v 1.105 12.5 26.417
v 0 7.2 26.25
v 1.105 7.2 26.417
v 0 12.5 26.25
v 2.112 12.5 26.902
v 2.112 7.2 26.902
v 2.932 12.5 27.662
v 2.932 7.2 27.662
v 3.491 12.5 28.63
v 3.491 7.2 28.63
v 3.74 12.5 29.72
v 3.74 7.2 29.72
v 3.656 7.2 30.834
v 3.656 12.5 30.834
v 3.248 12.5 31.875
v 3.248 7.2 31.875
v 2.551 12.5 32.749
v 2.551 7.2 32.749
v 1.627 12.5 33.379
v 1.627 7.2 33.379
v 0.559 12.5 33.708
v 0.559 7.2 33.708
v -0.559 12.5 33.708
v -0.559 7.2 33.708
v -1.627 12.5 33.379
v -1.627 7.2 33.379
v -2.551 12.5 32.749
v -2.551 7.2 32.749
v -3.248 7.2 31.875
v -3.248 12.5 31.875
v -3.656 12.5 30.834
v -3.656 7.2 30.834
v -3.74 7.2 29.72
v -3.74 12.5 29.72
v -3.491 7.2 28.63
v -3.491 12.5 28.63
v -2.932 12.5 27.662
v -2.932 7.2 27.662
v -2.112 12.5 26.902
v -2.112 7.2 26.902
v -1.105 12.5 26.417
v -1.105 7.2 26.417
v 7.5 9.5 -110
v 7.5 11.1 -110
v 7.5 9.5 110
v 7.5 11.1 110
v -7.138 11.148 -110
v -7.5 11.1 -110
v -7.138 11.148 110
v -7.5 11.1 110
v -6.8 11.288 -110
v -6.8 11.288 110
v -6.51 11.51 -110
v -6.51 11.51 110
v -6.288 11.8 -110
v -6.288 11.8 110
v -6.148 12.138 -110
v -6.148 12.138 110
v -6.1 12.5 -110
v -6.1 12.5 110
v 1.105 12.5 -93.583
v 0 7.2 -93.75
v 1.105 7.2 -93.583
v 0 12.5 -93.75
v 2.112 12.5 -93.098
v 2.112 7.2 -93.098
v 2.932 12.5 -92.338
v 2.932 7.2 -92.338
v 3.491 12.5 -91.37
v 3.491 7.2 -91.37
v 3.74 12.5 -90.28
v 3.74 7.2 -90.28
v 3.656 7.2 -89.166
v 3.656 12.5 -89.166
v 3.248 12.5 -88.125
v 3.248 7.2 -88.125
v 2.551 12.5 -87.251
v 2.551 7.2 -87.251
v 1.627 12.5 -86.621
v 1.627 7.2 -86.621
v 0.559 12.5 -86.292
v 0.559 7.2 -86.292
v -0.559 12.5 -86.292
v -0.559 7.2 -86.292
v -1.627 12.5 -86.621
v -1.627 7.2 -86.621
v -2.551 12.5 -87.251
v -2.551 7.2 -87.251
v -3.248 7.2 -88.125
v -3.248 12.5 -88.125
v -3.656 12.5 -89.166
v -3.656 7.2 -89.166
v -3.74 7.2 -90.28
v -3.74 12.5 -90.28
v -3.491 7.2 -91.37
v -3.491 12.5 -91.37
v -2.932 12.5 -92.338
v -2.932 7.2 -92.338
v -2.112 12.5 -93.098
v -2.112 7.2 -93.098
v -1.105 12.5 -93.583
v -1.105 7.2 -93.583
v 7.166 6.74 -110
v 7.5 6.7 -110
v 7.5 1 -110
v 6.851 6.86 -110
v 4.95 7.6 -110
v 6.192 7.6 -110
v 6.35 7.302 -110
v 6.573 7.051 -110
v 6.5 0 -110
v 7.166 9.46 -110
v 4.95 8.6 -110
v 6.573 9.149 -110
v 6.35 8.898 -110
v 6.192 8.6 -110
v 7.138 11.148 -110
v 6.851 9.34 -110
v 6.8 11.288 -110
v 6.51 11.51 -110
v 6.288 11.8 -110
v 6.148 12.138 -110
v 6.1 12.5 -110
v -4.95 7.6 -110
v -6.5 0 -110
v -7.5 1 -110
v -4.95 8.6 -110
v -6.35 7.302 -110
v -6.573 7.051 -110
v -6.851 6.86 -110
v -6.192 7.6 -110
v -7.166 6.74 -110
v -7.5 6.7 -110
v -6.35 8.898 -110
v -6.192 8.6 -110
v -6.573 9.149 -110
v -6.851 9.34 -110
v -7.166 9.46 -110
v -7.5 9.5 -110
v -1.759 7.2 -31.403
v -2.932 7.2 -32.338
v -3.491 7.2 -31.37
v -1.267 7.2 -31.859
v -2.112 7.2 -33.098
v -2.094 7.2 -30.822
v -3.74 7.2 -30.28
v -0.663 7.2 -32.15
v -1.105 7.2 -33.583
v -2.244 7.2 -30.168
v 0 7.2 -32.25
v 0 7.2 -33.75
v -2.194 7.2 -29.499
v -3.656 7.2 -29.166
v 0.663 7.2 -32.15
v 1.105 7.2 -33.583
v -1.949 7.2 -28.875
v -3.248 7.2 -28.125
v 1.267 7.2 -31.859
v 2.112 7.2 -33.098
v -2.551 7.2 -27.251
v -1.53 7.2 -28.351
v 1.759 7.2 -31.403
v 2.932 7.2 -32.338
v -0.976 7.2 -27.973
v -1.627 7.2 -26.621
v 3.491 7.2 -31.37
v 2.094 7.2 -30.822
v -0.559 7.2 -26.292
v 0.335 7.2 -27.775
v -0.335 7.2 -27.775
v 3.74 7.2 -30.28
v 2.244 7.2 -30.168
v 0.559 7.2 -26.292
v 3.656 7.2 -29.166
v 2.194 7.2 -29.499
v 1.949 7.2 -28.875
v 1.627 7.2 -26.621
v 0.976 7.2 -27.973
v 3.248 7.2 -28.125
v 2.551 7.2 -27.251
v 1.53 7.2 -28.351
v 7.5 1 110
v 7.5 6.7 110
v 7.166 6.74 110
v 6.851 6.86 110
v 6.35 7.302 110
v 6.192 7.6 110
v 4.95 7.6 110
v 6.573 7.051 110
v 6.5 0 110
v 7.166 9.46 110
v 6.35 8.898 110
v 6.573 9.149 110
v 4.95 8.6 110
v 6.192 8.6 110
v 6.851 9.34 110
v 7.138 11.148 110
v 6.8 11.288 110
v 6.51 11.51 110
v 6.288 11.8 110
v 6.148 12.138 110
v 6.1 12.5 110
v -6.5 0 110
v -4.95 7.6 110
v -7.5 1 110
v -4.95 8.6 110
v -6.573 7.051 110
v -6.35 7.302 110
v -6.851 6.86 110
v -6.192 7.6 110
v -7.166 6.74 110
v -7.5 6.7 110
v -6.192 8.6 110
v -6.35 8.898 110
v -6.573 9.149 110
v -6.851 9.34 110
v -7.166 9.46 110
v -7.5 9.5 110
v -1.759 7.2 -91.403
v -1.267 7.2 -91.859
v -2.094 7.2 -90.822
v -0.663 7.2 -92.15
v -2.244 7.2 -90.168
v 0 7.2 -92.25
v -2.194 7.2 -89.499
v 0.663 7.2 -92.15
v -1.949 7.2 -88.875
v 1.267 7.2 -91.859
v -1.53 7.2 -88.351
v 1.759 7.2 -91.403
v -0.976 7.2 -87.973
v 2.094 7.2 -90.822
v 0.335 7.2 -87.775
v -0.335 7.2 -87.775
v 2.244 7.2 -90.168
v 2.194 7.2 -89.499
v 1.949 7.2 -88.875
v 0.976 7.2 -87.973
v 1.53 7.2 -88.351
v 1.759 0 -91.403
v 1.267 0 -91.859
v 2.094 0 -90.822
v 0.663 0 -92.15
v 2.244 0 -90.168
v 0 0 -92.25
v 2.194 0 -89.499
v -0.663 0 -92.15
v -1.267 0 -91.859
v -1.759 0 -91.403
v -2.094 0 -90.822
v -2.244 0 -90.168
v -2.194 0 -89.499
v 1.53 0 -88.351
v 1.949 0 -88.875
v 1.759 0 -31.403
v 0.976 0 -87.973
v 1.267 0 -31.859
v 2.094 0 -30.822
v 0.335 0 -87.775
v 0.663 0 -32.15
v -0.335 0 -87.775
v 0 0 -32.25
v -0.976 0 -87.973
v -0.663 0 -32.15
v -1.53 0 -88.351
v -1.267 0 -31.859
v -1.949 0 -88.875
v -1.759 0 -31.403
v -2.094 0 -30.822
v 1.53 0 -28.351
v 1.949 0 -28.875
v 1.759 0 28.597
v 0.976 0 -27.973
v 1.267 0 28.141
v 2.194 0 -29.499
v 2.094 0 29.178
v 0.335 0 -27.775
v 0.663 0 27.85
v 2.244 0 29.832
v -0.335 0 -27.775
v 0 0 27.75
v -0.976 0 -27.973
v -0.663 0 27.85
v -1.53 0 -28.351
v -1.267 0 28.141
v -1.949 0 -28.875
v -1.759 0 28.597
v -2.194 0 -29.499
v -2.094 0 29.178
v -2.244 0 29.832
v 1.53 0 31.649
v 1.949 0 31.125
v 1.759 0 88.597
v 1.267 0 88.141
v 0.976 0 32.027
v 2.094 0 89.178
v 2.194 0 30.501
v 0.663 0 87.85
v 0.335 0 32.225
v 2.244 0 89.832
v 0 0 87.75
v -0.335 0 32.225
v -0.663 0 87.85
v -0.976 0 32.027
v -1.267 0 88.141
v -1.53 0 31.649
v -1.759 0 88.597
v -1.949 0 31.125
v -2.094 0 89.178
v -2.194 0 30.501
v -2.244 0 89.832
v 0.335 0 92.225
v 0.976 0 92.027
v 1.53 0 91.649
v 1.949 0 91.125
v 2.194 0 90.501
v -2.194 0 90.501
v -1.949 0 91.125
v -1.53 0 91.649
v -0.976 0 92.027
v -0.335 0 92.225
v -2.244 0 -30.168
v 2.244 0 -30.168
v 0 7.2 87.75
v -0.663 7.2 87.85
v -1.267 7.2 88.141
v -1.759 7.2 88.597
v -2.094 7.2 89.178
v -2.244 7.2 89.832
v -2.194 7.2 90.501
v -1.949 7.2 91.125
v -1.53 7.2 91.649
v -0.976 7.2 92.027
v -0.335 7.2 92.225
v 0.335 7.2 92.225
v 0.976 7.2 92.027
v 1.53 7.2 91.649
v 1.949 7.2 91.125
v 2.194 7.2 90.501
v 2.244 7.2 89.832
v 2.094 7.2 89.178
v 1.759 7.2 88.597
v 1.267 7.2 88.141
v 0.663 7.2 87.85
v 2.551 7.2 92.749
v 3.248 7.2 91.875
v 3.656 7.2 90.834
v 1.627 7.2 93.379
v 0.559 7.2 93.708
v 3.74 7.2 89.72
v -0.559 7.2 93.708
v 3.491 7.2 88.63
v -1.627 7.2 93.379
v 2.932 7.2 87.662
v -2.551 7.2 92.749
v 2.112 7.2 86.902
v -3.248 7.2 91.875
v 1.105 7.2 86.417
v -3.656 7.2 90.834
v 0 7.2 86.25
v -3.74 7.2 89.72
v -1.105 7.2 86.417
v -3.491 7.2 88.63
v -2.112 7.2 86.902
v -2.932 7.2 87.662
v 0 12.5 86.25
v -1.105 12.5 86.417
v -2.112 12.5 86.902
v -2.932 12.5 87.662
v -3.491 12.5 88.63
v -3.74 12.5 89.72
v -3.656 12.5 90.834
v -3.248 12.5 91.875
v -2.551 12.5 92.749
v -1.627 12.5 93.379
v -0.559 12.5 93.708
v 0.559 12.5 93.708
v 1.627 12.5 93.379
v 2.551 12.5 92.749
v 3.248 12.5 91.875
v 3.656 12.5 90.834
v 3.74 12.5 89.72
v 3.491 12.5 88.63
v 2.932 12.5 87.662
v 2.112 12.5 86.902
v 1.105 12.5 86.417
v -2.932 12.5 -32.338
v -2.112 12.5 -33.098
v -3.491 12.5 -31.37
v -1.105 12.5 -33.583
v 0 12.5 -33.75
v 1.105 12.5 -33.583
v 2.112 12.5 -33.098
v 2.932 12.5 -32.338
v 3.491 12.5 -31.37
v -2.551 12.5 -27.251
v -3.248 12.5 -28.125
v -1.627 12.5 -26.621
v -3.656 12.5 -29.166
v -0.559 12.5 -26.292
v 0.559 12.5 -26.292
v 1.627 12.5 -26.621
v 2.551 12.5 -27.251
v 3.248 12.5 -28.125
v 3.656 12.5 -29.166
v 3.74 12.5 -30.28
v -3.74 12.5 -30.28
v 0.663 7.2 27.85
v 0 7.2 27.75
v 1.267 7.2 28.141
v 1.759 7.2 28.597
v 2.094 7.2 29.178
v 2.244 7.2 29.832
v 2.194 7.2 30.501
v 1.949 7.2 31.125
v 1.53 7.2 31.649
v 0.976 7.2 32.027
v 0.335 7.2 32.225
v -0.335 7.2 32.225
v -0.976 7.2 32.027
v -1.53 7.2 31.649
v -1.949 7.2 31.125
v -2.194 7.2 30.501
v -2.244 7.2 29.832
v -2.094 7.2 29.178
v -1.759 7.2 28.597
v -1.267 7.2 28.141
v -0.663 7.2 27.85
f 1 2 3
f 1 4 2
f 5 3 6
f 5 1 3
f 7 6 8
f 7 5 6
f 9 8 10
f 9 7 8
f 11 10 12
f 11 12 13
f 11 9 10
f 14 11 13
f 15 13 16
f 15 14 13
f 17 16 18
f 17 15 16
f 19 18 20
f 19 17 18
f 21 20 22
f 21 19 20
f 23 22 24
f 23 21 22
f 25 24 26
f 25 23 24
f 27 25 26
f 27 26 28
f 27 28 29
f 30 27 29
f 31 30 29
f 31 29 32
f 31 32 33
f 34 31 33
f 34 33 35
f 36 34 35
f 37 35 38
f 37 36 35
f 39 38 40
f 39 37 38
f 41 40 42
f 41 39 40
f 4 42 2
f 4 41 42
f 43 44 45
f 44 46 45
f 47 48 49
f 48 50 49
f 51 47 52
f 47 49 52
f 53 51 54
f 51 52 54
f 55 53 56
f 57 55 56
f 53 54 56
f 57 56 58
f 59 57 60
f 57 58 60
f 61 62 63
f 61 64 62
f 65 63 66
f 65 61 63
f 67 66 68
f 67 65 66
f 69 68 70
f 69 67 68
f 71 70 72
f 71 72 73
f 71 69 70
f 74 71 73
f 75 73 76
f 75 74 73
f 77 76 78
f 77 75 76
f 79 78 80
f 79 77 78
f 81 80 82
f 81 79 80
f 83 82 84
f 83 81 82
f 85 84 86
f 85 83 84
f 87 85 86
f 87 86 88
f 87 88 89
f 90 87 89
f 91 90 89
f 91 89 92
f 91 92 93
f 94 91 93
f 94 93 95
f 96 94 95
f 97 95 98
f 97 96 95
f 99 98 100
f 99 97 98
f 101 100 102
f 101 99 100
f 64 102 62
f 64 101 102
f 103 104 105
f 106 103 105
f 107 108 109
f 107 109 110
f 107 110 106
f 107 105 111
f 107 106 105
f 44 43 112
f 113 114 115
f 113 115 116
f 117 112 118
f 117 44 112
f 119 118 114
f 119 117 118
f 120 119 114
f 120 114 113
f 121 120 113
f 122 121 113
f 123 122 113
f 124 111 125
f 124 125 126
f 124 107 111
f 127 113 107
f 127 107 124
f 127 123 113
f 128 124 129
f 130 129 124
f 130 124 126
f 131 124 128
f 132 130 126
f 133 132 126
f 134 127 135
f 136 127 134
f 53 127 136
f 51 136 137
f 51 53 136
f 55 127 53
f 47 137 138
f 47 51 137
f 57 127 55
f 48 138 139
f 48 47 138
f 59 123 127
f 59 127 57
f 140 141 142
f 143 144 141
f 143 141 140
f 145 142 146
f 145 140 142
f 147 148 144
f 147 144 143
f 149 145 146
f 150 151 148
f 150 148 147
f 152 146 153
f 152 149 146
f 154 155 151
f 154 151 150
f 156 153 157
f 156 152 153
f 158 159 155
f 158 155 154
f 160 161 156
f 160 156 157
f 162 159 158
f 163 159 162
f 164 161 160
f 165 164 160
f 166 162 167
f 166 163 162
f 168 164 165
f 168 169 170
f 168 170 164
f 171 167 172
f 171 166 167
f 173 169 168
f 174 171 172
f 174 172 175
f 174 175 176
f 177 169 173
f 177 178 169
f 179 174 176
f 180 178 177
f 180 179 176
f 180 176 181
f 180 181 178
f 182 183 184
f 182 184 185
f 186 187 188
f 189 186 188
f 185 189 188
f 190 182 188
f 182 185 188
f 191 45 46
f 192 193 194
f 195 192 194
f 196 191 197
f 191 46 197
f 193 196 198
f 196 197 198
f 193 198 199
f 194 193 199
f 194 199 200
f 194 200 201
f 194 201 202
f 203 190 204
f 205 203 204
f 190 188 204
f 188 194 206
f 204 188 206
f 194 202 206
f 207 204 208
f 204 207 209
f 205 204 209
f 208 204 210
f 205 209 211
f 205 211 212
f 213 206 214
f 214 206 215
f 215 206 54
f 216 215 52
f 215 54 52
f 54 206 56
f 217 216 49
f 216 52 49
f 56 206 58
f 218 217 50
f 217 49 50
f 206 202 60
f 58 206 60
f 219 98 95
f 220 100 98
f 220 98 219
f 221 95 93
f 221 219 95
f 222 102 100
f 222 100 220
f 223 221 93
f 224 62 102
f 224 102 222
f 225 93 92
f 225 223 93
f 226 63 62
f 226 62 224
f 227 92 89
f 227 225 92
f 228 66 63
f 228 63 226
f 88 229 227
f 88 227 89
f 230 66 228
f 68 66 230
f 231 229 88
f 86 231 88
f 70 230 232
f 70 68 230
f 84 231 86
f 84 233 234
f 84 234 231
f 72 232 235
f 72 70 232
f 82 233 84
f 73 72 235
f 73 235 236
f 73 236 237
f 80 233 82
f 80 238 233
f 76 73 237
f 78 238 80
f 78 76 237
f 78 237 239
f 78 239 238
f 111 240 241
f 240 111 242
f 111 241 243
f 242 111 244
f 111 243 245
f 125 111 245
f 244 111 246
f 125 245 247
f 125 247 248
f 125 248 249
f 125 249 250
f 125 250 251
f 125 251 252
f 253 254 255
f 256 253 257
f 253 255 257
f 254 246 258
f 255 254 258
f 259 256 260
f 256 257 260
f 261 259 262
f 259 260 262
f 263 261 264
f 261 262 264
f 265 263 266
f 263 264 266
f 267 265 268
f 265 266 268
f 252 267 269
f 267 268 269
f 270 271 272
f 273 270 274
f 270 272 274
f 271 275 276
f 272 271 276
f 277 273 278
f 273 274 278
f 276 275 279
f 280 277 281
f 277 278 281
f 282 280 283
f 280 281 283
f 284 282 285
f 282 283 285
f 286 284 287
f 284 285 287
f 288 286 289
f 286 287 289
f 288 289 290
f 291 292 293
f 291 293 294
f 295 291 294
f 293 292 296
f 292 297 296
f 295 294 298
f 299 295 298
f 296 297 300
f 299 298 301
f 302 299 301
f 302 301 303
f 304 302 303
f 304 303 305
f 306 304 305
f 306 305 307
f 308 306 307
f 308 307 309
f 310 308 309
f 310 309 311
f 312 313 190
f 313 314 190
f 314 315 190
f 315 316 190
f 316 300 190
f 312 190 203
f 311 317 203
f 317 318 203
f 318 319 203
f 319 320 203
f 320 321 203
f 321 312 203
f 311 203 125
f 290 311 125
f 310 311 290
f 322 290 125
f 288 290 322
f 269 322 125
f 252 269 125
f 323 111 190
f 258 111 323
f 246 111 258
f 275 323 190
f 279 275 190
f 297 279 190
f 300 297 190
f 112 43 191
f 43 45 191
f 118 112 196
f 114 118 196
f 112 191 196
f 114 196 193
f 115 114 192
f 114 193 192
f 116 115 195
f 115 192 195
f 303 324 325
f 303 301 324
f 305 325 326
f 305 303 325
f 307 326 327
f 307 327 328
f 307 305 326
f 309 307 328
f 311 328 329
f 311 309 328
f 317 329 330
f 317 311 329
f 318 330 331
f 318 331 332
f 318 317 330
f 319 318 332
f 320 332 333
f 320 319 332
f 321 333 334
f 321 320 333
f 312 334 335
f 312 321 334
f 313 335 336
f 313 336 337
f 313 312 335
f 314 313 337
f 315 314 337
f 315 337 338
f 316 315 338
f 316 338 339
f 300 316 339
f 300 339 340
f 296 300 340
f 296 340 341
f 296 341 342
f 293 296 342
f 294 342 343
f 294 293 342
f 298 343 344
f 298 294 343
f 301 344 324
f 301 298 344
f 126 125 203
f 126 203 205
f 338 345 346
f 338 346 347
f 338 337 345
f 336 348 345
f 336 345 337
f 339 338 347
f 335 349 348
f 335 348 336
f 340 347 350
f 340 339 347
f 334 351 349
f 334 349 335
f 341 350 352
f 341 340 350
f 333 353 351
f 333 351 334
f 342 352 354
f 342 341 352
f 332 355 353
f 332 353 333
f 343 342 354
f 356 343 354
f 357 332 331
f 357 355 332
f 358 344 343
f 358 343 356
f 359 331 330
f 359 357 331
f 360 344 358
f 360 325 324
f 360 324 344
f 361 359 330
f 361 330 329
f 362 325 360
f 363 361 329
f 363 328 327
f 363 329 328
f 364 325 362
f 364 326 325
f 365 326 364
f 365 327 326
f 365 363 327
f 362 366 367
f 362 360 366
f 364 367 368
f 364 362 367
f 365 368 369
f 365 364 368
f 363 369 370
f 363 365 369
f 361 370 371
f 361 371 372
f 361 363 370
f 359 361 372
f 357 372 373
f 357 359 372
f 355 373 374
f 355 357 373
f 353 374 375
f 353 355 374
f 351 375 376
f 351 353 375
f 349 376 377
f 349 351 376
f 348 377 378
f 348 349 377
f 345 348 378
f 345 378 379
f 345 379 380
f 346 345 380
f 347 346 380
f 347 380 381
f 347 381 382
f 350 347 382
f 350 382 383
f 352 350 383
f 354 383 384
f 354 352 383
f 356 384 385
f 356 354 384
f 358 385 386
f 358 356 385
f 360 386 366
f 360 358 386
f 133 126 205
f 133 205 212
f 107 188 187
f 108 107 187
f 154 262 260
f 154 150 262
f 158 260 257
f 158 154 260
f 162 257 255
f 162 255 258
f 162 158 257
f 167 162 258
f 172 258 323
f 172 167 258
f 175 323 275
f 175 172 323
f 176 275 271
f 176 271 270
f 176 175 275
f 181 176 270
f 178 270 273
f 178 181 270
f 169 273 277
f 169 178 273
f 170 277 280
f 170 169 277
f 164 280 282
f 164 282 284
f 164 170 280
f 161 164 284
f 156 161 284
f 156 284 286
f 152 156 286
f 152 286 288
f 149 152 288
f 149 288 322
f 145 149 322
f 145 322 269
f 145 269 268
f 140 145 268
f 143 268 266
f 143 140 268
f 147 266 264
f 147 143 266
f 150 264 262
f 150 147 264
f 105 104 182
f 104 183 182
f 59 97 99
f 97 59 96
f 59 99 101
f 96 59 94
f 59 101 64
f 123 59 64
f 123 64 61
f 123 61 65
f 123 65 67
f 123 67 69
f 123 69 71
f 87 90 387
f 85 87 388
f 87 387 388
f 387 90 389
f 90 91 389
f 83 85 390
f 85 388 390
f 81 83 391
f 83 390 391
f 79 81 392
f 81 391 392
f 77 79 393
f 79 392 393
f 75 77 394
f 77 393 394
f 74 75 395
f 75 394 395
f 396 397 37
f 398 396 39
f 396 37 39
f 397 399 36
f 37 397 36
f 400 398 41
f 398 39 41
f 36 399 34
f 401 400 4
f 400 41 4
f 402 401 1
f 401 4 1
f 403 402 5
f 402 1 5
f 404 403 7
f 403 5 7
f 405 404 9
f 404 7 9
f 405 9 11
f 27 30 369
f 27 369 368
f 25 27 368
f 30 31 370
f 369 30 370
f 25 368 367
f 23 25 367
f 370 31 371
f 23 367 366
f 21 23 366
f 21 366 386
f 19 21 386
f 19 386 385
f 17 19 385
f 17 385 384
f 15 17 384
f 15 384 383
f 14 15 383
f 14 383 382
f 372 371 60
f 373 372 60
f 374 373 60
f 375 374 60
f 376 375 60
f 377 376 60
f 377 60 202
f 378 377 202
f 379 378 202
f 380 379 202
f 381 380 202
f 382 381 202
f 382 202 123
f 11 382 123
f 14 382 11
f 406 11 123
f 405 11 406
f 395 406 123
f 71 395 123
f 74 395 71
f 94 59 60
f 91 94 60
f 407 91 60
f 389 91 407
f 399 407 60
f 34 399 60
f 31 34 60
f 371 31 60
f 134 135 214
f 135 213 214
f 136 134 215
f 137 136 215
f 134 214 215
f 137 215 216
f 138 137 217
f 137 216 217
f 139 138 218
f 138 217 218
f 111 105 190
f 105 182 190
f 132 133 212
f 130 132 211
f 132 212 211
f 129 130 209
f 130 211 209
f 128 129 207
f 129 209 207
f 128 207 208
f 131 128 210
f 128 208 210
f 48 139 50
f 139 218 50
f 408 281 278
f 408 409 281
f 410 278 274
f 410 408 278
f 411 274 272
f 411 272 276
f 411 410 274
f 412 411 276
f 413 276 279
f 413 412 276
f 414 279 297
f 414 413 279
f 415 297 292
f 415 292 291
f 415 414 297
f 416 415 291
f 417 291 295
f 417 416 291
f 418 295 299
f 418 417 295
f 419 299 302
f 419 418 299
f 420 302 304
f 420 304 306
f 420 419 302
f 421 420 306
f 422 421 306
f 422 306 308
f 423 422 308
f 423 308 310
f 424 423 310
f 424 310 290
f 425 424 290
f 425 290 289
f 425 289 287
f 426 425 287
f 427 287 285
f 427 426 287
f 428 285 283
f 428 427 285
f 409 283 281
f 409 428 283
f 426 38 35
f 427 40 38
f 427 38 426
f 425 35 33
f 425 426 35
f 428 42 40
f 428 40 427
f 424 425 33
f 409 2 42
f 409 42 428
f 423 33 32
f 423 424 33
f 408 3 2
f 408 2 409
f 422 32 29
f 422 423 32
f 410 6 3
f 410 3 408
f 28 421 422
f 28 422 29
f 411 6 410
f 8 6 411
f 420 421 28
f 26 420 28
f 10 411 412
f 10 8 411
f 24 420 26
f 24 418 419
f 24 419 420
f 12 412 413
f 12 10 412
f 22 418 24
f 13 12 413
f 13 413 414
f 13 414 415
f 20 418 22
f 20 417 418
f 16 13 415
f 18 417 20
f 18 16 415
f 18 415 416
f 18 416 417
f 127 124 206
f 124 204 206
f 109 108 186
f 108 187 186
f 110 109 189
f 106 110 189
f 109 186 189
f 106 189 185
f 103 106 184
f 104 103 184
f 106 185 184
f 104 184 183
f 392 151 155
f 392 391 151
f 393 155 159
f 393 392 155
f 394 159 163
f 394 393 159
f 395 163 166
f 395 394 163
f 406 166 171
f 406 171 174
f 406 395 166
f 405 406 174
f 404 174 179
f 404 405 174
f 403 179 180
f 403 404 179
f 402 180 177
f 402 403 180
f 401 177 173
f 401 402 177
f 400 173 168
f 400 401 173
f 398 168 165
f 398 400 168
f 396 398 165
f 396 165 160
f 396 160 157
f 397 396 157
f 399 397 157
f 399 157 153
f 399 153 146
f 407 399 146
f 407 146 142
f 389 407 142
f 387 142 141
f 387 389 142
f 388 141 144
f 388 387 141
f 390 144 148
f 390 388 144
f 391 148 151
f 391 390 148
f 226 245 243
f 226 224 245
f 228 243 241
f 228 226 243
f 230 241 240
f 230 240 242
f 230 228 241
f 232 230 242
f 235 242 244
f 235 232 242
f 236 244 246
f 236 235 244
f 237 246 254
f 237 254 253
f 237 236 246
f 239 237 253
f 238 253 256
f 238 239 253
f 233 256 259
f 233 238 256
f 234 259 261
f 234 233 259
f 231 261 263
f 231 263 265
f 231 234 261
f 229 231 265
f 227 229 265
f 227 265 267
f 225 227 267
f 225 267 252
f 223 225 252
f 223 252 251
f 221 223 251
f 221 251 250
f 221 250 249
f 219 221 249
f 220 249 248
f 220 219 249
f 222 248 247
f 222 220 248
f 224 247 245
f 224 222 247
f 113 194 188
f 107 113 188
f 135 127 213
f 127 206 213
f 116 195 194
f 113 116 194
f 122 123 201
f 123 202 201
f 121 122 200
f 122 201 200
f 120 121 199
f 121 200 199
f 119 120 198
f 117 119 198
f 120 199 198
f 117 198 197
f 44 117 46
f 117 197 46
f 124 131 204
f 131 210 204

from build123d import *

# Parameters (mm, degrees)
EXTRUDE1_DEPTH  = 110
LPATTERN1_COUNT = 3
LPATTERN1_PITCH = 60


with BuildPart() as part:
    # 15mm → Extrude1 (new, symmetric)
    with BuildSketch(Plane.XY):
        with BuildLine():
            Line((4.949972, 7.600006), (6.192321846, 7.599996))
            ThreePointArc((6.192321846, 7.599996), (6.706266371, 6.946742527), (7.49999, 6.7))
            Line((7.49999, 6.7), (7.49999, 1.000024142))
            Line((7.49999, 1.000024142), (6.499965858, 0))
            Line((6.499965858, 0), (-6.499965858, 0))
            Line((-6.499965858, 0), (-7.49999, 1.000024142))
            Line((-7.49999, 1.000024142), (-7.49999, 6.7))
            ThreePointArc((-7.49999, 6.7), (-6.70626637, 6.946742527), (-6.192321846, 7.599996))
            Line((-6.192321846, 7.599996), (-4.949982, 7.599996))
            Line((-4.949982, 7.599996), (-4.949972, 8.600006))
            Line((-4.949972, 8.600006), (-6.192326435, 8.600016))
            ThreePointArc((-6.192326435, 8.600016), (-6.706271662, 9.253261115), (-7.49999, 9.5))
            Line((-7.49999, 9.5), (-7.49999, 11.099974))
            ThreePointArc((-7.49999, 11.099974), (-6.510037425, 11.510033031), (-6.099989, 12.49999))
            Line((-6.099989, 12.49999), (6.099989, 12.49999))
            ThreePointArc((6.099989, 12.49999), (6.510037425, 11.510033031), (7.49999, 11.099974))
            Line((7.49999, 11.099974), (7.49999, 9.5))
            ThreePointArc((7.49999, 9.5), (6.706271662, 9.253261115), (6.192326435, 8.600016))
            Line((6.192326435, 8.600016), (4.949982, 8.600016))
            Line((4.949982, 8.600016), (4.949972, 7.600006))
        make_face()
    extrude(amount=EXTRUDE1_DEPTH, both=True)

    # Sketch1 → Cut-Revolve1 (revolve, cut)
    with BuildSketch(Plane(origin=(0, 0, 0), x_dir=(0, 0, -1), z_dir=(1, 0, 0))):
        Polygon((-90, 12.49999), (-86.25, 12.49999), (-86.25, 7.19999), (-87.75, 7.19999), (-87.75, 0), (-90, 0), align=None)
    revolve(axis=Axis((0, 0, 90), (0, 1, 0)), mode=Mode.SUBTRACT)

    # Sketch2 → Cut-Revolve2 (revolve, cut)
    with BuildSketch(Plane(origin=(0, 0, 0), x_dir=(0, 0, -1), z_dir=(1, 0, 0))):
        Polygon((90, 0), (92.25, 0), (92.25, 7.19999), (93.75, 7.19999), (93.75, 12.49999), (90, 12.49999), align=None)
    cut_revolve2 = revolve(axis=Axis((0, 12.49999, -90), (0, -1, 0)), mode=Mode.SUBTRACT)

    # LPattern1: Cut-Revolve2 ×3
    with Locations(*[(0, 0, i * LPATTERN1_PITCH) for i in range(1, LPATTERN1_COUNT)]):
        add(cut_revolve2, mode=Mode.SUBTRACT)


solid = part.part
